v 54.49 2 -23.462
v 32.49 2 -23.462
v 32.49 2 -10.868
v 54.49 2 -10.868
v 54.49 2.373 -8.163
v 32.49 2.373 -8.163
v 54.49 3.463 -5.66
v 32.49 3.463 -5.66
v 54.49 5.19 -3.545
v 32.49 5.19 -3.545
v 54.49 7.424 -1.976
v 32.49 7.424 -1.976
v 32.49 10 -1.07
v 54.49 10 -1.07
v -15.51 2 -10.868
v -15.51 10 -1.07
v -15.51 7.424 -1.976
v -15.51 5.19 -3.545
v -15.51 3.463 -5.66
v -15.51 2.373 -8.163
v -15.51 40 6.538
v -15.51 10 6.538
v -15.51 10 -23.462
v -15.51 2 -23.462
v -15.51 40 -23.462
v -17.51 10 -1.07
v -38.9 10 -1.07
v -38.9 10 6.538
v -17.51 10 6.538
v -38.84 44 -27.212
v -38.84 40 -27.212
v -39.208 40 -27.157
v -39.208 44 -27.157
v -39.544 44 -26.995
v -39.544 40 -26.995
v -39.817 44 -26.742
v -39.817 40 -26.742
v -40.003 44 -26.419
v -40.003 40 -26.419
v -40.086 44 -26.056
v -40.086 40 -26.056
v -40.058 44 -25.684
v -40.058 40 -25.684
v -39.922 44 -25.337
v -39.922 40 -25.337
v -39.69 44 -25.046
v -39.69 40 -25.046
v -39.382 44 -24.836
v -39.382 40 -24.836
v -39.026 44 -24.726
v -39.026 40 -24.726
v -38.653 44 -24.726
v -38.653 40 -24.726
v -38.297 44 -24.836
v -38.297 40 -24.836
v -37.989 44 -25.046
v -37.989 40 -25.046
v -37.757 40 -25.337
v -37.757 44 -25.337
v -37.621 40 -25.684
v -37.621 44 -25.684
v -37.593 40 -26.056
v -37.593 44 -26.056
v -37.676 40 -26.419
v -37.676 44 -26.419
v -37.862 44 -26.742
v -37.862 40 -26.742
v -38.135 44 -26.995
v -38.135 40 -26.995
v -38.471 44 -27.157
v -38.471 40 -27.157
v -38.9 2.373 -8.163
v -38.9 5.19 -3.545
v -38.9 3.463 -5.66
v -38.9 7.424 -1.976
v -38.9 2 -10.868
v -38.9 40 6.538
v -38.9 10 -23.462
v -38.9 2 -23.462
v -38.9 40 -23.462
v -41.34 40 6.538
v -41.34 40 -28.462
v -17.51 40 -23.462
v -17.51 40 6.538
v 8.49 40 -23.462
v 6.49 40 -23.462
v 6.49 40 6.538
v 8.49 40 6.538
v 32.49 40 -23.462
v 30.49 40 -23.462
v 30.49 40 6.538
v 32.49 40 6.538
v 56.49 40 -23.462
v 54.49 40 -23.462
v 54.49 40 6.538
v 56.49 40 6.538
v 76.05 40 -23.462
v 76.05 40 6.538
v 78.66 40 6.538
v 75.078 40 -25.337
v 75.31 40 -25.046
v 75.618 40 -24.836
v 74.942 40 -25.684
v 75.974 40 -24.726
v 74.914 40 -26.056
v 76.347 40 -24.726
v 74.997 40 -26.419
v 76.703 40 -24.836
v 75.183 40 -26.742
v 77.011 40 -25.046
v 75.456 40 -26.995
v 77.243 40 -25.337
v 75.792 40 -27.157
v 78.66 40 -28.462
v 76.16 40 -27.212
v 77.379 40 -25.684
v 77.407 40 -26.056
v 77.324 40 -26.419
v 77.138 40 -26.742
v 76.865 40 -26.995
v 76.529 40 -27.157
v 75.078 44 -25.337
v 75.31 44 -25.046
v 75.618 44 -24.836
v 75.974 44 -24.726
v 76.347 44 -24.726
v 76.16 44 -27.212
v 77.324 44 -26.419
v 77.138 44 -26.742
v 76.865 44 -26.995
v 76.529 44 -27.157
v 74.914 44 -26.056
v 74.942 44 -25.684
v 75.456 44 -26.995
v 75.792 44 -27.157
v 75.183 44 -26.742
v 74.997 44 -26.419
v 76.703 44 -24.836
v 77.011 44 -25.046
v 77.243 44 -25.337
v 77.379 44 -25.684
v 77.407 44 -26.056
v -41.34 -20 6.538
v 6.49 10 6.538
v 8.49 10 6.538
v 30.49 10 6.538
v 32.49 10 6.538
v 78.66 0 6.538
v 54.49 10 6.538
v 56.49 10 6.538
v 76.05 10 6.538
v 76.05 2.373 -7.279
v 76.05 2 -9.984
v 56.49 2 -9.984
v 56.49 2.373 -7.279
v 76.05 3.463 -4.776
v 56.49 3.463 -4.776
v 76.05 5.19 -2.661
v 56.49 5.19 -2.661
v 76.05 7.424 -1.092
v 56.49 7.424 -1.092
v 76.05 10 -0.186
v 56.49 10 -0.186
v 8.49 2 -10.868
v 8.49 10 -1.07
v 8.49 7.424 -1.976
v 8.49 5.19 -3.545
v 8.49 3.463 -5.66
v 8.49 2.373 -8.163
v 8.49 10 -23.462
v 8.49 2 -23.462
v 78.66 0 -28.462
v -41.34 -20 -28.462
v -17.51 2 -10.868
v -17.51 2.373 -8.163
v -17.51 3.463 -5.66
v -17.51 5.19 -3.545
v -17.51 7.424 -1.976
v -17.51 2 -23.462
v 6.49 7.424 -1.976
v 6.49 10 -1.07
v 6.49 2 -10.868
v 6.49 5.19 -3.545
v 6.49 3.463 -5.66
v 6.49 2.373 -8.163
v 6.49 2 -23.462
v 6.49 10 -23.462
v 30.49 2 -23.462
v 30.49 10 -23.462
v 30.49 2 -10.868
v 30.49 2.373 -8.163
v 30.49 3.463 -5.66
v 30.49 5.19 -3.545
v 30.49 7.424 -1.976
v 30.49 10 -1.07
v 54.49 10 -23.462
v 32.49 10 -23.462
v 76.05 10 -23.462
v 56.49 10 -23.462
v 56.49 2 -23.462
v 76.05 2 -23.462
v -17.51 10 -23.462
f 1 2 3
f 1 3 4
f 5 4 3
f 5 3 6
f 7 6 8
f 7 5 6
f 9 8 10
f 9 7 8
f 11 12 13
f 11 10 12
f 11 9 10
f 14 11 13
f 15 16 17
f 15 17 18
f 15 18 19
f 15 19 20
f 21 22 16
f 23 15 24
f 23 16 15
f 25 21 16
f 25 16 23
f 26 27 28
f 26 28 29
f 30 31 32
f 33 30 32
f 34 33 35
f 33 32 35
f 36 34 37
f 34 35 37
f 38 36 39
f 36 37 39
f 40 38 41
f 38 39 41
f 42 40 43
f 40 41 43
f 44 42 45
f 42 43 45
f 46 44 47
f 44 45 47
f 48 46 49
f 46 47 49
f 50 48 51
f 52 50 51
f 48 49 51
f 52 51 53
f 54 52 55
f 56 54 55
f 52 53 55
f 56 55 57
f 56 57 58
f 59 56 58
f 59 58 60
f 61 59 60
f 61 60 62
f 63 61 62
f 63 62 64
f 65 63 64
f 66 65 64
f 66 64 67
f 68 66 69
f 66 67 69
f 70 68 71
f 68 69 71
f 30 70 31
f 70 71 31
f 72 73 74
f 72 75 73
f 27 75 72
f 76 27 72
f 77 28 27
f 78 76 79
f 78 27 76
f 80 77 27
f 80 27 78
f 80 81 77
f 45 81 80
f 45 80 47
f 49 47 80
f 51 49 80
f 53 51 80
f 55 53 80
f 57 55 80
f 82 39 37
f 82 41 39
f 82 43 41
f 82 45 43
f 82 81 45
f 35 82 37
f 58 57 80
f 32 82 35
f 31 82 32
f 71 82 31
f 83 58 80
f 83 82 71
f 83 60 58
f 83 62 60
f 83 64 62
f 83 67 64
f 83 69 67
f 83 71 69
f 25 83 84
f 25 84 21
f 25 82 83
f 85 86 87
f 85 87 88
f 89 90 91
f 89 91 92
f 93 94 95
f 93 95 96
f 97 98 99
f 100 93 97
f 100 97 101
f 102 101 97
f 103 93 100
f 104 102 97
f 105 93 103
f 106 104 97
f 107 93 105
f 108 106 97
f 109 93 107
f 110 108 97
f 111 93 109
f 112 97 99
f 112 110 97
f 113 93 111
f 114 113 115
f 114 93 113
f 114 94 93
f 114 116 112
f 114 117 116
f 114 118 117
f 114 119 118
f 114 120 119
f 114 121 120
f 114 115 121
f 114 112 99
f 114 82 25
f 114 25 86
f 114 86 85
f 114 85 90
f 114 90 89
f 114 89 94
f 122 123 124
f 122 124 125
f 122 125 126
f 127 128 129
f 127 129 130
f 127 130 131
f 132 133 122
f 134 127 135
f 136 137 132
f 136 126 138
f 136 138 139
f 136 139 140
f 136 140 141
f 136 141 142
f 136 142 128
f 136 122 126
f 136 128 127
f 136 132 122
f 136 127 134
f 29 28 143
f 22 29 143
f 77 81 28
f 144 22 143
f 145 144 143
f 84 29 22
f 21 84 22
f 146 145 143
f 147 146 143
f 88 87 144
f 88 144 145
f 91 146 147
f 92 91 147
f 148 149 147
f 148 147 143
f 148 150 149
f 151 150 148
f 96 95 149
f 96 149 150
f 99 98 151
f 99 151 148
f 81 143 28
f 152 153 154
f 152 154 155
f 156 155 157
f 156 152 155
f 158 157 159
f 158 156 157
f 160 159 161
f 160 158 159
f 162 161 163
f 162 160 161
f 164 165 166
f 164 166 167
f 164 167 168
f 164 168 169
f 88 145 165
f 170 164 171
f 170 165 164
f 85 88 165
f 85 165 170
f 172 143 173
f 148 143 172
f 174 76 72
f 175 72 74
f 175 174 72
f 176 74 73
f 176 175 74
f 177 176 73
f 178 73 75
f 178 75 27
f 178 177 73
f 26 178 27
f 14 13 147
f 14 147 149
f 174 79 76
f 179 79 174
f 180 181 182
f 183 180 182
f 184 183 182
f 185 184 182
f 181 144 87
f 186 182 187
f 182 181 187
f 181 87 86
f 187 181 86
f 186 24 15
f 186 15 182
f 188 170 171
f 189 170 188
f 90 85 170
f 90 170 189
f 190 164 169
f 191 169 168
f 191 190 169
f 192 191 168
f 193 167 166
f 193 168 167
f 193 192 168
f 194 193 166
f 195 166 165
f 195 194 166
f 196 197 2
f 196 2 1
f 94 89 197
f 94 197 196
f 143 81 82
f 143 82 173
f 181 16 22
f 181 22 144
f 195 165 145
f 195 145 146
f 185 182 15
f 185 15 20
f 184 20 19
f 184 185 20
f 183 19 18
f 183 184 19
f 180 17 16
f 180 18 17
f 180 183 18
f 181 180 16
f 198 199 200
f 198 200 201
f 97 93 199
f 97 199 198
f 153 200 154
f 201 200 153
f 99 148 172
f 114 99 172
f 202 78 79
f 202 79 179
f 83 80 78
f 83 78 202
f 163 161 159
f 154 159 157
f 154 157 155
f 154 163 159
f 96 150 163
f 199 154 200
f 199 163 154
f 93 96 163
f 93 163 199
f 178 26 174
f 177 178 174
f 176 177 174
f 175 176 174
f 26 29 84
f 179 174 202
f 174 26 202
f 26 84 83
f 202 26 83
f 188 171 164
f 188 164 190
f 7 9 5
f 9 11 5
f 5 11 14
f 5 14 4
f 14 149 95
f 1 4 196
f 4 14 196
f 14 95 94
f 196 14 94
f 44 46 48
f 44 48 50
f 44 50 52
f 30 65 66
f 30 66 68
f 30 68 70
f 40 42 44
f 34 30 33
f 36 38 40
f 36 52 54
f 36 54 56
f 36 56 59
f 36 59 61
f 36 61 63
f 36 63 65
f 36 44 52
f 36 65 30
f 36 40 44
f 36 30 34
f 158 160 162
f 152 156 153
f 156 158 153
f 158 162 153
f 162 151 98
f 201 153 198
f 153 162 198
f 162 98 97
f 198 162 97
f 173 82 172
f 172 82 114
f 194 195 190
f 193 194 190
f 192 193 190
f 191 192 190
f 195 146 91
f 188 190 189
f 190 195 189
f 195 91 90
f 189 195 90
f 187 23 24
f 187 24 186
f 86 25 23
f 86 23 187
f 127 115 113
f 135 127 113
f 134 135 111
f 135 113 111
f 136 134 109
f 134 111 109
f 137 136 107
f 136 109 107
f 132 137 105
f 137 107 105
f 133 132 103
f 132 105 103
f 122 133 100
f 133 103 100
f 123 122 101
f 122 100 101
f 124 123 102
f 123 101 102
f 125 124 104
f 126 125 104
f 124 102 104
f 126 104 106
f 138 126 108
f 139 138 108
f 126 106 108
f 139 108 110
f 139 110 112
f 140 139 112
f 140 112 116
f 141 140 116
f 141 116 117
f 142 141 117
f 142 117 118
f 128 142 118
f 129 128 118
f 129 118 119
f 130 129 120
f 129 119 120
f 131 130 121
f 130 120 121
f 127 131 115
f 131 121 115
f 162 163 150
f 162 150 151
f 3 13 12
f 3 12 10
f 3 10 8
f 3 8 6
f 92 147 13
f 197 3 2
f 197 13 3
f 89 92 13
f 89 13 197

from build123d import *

# Parameters (mm, degrees)
SKETCH1_W           = 120
SKETCH1_H           = 35
BOSS_EXTRUDE1_DEPTH = 40
SKETCH2_W           = 21.39
SKETCH2_H           = 30
SKETCH2_W_2         = 22
SKETCH2_W_3         = 19.56
CUT_EXTRUDE1_DEPTH  = 30
SKETCH3_W           = 21.39
SKETCH3_H           = 22.392557851
SKETCH3_W_2         = 22
SKETCH3_W_3         = 19.56
SKETCH3_H_2         = 23.276606707
CUT_EXTRUDE2_DEPTH  = 8
FILLET1_R           = 10
SKETCH4_R           = 1.25
BOSS_EXTRUDE2_DEPTH = 4
BOSS_EXTRUDE3_DEPTH = 35


with BuildPart() as part:
    # Sketch1 → Boss-Extrude1 (new body)
    with BuildSketch(Plane(origin=(0, 0, 0), x_dir=(1, 0, 0), z_dir=(0, 1, 0))):
        with Locations((18.660377358, 10.962264151)):
            Rectangle(SKETCH1_W, SKETCH1_H)
    extrude(amount=BOSS_EXTRUDE1_DEPTH)

    # Sketch2 → Cut-Extrude1 (cut)
    with BuildSketch(Plane(origin=(0, 40, 0), x_dir=(1, 0, 0), z_dir=(0, 1, 0))):
        with Locations((-28.204622642, 8.462264151)):
            Rectangle(SKETCH2_W, SKETCH2_H)
        with Locations((-4.509622642, 8.462264151)):
            Rectangle(SKETCH2_W_2, SKETCH2_H)
        with Locations((19.490377358, 8.462264151)):
            Rectangle(SKETCH2_W_2, SKETCH2_H)
        with Locations((43.490377358, 8.462264151)):
            Rectangle(SKETCH2_W_2, SKETCH2_H)
        with Locations((66.270377358, 8.462264151)):
            Rectangle(SKETCH2_W_3, SKETCH2_H)
    extrude(amount=-CUT_EXTRUDE1_DEPTH, mode=Mode.SUBTRACT)

    # Sketch3 → Cut-Extrude2 (cut)
    with BuildSketch(Plane(origin=(0, 10, 0), x_dir=(1, 0, 0), z_dir=(0, 1, 0))):
        with Locations((-28.204622642, 12.265985226)):
            Rectangle(SKETCH3_W, SKETCH3_H)
        with Locations((-4.509622642, 12.265985226)):
            Rectangle(SKETCH3_W_2, SKETCH3_H)
        with Locations((19.490377358, 12.265985226)):
            Rectangle(SKETCH3_W_2, SKETCH3_H)
        with Locations((43.490377358, 12.265985226)):
            Rectangle(SKETCH3_W_2, SKETCH3_H)
        with Locations((66.270377358, 11.823960798)):
            Rectangle(SKETCH3_W_3, SKETCH3_H_2)
    extrude(amount=-CUT_EXTRUDE2_DEPTH, mode=Mode.SUBTRACT)

    # Fillet1
    # the kernel refuses this fillet: 10 mm, written as the material it adds along each edge
    with BuildSketch(Plane(origin=(76.050377358, 2, -0.185657444), x_dir=(0, 0, -1), z_dir=(-1, 0, 0))) as fillet1_piece_1:
        with BuildLine():
            CenterArc((9.797958971, -10), FILLET1_R, 90, 78.463040967)
            Line((0, -8), (-0.195959179, -7.96))
            ThreePointArc((-0.195959179, -7.96), (-0.2, -4), (-0.2, 0))
            Line((-0.2, 0), (0, 0.2))
            Line((0, 0.2), (9.797958971, 0.2))
            Line((9.797958971, 0.2), (9.797958971, 0))
        make_face()
    extrude(amount=44.054897428)
    with BuildSketch(Plane(origin=(54.490377358, 2, -1.0697063), x_dir=(0, 1, 0), z_dir=(-1, 0, 0))) as fillet1_piece_2:
        with BuildLine():
            CenterArc((10, 9.797958971), FILLET1_R, 180, 78.463040967)
            Line((0, 9.797958971), (-0.2, 9.797958971))
            Line((-0.2, 9.797958971), (-0.2, 0))
            Line((-0.2, 0), (0, -0.2))
            ThreePointArc((0, -0.2), (4, -0.2), (7.96, -0.195959179))
            Line((7.96, -0.195959179), (8, 0))
        make_face()
    extrude(amount=46.494897428)
    with BuildSketch(Plane(origin=(54.985274786, 2, -1.0697063), x_dir=(0, 1, 0), z_dir=(-1, 0, 0))) as fillet1_piece_3:
        with BuildLine():
            CenterArc((10, 9.797958971), FILLET1_R, 180, 78.463040967)
            Line((0, 9.797958971), (-0.2, 9.797958971))
            Line((-0.2, 9.797958971), (-0.2, 0))
            Line((-0.2, 0), (0, -0.2))
            ThreePointArc((0, -0.2), (4, -0.2), (7.96, -0.195959179))
            Line((7.96, -0.195959179), (8, 0))
        make_face()
    extrude(amount=70.989794856)
    with BuildSketch(Plane(origin=(6.985274786, 2, -1.0697063), x_dir=(0, 1, 0), z_dir=(-1, 0, 0))) as fillet1_piece_4:
        with BuildLine():
            CenterArc((10, 9.797958971), FILLET1_R, 180, 78.463040967)
            Line((0, 9.797958971), (-0.2, 9.797958971))
            Line((-0.2, 9.797958971), (-0.2, 0))
            Line((-0.2, 0), (0, -0.2))
            ThreePointArc((0, -0.2), (4, -0.2), (7.96, -0.195959179))
            Line((7.96, -0.195959179), (8, 0))
        make_face()
    extrude(amount=45.884897428)
    with BuildSketch(Plane(origin=(30.985274786, 2, -1.0697063), x_dir=(0, 0, -1), z_dir=(-1, 0, 0))) as fillet1_piece_5:
        with BuildLine():
            CenterArc((9.797958971, -10), FILLET1_R, 90, 78.463040967)
            Line((0, -8), (-0.195959179, -7.96))
            ThreePointArc((-0.195959179, -7.96), (-0.2, -4), (-0.2, 0))
            Line((-0.2, 0), (0, 0.2))
            Line((0, 0.2), (9.797958971, 0.2))
            Line((9.797958971, 0.2), (9.797958971, 0))
        make_face()
    extrude(amount=70.989794856)

    # Sketch4 → Boss-Extrude2 (add)
    with BuildSketch(Plane(origin=(0, 40, 0), x_dir=(1, 0, 0), z_dir=(0, 1, 0))):
        with Locations(Location((-38.839622642, 25.962264151, 0), (0, 0, 90))):
            Circle(SKETCH4_R)
        with Locations(Location((76.160377358, 25.962264151, 0), (0, 0, 90))):
            Circle(SKETCH4_R)
    extrude(amount=BOSS_EXTRUDE2_DEPTH)

    # Sketch5 → Boss-Extrude3 (add)
    with BuildSketch(Plane.XY.offset(6.537735849)):
        Polygon((-41.339622642, 0), (-41.339622642, -20), (78.660377358, 0), align=None)
    extrude(amount=-BOSS_EXTRUDE3_DEPTH)


solid = part.part
